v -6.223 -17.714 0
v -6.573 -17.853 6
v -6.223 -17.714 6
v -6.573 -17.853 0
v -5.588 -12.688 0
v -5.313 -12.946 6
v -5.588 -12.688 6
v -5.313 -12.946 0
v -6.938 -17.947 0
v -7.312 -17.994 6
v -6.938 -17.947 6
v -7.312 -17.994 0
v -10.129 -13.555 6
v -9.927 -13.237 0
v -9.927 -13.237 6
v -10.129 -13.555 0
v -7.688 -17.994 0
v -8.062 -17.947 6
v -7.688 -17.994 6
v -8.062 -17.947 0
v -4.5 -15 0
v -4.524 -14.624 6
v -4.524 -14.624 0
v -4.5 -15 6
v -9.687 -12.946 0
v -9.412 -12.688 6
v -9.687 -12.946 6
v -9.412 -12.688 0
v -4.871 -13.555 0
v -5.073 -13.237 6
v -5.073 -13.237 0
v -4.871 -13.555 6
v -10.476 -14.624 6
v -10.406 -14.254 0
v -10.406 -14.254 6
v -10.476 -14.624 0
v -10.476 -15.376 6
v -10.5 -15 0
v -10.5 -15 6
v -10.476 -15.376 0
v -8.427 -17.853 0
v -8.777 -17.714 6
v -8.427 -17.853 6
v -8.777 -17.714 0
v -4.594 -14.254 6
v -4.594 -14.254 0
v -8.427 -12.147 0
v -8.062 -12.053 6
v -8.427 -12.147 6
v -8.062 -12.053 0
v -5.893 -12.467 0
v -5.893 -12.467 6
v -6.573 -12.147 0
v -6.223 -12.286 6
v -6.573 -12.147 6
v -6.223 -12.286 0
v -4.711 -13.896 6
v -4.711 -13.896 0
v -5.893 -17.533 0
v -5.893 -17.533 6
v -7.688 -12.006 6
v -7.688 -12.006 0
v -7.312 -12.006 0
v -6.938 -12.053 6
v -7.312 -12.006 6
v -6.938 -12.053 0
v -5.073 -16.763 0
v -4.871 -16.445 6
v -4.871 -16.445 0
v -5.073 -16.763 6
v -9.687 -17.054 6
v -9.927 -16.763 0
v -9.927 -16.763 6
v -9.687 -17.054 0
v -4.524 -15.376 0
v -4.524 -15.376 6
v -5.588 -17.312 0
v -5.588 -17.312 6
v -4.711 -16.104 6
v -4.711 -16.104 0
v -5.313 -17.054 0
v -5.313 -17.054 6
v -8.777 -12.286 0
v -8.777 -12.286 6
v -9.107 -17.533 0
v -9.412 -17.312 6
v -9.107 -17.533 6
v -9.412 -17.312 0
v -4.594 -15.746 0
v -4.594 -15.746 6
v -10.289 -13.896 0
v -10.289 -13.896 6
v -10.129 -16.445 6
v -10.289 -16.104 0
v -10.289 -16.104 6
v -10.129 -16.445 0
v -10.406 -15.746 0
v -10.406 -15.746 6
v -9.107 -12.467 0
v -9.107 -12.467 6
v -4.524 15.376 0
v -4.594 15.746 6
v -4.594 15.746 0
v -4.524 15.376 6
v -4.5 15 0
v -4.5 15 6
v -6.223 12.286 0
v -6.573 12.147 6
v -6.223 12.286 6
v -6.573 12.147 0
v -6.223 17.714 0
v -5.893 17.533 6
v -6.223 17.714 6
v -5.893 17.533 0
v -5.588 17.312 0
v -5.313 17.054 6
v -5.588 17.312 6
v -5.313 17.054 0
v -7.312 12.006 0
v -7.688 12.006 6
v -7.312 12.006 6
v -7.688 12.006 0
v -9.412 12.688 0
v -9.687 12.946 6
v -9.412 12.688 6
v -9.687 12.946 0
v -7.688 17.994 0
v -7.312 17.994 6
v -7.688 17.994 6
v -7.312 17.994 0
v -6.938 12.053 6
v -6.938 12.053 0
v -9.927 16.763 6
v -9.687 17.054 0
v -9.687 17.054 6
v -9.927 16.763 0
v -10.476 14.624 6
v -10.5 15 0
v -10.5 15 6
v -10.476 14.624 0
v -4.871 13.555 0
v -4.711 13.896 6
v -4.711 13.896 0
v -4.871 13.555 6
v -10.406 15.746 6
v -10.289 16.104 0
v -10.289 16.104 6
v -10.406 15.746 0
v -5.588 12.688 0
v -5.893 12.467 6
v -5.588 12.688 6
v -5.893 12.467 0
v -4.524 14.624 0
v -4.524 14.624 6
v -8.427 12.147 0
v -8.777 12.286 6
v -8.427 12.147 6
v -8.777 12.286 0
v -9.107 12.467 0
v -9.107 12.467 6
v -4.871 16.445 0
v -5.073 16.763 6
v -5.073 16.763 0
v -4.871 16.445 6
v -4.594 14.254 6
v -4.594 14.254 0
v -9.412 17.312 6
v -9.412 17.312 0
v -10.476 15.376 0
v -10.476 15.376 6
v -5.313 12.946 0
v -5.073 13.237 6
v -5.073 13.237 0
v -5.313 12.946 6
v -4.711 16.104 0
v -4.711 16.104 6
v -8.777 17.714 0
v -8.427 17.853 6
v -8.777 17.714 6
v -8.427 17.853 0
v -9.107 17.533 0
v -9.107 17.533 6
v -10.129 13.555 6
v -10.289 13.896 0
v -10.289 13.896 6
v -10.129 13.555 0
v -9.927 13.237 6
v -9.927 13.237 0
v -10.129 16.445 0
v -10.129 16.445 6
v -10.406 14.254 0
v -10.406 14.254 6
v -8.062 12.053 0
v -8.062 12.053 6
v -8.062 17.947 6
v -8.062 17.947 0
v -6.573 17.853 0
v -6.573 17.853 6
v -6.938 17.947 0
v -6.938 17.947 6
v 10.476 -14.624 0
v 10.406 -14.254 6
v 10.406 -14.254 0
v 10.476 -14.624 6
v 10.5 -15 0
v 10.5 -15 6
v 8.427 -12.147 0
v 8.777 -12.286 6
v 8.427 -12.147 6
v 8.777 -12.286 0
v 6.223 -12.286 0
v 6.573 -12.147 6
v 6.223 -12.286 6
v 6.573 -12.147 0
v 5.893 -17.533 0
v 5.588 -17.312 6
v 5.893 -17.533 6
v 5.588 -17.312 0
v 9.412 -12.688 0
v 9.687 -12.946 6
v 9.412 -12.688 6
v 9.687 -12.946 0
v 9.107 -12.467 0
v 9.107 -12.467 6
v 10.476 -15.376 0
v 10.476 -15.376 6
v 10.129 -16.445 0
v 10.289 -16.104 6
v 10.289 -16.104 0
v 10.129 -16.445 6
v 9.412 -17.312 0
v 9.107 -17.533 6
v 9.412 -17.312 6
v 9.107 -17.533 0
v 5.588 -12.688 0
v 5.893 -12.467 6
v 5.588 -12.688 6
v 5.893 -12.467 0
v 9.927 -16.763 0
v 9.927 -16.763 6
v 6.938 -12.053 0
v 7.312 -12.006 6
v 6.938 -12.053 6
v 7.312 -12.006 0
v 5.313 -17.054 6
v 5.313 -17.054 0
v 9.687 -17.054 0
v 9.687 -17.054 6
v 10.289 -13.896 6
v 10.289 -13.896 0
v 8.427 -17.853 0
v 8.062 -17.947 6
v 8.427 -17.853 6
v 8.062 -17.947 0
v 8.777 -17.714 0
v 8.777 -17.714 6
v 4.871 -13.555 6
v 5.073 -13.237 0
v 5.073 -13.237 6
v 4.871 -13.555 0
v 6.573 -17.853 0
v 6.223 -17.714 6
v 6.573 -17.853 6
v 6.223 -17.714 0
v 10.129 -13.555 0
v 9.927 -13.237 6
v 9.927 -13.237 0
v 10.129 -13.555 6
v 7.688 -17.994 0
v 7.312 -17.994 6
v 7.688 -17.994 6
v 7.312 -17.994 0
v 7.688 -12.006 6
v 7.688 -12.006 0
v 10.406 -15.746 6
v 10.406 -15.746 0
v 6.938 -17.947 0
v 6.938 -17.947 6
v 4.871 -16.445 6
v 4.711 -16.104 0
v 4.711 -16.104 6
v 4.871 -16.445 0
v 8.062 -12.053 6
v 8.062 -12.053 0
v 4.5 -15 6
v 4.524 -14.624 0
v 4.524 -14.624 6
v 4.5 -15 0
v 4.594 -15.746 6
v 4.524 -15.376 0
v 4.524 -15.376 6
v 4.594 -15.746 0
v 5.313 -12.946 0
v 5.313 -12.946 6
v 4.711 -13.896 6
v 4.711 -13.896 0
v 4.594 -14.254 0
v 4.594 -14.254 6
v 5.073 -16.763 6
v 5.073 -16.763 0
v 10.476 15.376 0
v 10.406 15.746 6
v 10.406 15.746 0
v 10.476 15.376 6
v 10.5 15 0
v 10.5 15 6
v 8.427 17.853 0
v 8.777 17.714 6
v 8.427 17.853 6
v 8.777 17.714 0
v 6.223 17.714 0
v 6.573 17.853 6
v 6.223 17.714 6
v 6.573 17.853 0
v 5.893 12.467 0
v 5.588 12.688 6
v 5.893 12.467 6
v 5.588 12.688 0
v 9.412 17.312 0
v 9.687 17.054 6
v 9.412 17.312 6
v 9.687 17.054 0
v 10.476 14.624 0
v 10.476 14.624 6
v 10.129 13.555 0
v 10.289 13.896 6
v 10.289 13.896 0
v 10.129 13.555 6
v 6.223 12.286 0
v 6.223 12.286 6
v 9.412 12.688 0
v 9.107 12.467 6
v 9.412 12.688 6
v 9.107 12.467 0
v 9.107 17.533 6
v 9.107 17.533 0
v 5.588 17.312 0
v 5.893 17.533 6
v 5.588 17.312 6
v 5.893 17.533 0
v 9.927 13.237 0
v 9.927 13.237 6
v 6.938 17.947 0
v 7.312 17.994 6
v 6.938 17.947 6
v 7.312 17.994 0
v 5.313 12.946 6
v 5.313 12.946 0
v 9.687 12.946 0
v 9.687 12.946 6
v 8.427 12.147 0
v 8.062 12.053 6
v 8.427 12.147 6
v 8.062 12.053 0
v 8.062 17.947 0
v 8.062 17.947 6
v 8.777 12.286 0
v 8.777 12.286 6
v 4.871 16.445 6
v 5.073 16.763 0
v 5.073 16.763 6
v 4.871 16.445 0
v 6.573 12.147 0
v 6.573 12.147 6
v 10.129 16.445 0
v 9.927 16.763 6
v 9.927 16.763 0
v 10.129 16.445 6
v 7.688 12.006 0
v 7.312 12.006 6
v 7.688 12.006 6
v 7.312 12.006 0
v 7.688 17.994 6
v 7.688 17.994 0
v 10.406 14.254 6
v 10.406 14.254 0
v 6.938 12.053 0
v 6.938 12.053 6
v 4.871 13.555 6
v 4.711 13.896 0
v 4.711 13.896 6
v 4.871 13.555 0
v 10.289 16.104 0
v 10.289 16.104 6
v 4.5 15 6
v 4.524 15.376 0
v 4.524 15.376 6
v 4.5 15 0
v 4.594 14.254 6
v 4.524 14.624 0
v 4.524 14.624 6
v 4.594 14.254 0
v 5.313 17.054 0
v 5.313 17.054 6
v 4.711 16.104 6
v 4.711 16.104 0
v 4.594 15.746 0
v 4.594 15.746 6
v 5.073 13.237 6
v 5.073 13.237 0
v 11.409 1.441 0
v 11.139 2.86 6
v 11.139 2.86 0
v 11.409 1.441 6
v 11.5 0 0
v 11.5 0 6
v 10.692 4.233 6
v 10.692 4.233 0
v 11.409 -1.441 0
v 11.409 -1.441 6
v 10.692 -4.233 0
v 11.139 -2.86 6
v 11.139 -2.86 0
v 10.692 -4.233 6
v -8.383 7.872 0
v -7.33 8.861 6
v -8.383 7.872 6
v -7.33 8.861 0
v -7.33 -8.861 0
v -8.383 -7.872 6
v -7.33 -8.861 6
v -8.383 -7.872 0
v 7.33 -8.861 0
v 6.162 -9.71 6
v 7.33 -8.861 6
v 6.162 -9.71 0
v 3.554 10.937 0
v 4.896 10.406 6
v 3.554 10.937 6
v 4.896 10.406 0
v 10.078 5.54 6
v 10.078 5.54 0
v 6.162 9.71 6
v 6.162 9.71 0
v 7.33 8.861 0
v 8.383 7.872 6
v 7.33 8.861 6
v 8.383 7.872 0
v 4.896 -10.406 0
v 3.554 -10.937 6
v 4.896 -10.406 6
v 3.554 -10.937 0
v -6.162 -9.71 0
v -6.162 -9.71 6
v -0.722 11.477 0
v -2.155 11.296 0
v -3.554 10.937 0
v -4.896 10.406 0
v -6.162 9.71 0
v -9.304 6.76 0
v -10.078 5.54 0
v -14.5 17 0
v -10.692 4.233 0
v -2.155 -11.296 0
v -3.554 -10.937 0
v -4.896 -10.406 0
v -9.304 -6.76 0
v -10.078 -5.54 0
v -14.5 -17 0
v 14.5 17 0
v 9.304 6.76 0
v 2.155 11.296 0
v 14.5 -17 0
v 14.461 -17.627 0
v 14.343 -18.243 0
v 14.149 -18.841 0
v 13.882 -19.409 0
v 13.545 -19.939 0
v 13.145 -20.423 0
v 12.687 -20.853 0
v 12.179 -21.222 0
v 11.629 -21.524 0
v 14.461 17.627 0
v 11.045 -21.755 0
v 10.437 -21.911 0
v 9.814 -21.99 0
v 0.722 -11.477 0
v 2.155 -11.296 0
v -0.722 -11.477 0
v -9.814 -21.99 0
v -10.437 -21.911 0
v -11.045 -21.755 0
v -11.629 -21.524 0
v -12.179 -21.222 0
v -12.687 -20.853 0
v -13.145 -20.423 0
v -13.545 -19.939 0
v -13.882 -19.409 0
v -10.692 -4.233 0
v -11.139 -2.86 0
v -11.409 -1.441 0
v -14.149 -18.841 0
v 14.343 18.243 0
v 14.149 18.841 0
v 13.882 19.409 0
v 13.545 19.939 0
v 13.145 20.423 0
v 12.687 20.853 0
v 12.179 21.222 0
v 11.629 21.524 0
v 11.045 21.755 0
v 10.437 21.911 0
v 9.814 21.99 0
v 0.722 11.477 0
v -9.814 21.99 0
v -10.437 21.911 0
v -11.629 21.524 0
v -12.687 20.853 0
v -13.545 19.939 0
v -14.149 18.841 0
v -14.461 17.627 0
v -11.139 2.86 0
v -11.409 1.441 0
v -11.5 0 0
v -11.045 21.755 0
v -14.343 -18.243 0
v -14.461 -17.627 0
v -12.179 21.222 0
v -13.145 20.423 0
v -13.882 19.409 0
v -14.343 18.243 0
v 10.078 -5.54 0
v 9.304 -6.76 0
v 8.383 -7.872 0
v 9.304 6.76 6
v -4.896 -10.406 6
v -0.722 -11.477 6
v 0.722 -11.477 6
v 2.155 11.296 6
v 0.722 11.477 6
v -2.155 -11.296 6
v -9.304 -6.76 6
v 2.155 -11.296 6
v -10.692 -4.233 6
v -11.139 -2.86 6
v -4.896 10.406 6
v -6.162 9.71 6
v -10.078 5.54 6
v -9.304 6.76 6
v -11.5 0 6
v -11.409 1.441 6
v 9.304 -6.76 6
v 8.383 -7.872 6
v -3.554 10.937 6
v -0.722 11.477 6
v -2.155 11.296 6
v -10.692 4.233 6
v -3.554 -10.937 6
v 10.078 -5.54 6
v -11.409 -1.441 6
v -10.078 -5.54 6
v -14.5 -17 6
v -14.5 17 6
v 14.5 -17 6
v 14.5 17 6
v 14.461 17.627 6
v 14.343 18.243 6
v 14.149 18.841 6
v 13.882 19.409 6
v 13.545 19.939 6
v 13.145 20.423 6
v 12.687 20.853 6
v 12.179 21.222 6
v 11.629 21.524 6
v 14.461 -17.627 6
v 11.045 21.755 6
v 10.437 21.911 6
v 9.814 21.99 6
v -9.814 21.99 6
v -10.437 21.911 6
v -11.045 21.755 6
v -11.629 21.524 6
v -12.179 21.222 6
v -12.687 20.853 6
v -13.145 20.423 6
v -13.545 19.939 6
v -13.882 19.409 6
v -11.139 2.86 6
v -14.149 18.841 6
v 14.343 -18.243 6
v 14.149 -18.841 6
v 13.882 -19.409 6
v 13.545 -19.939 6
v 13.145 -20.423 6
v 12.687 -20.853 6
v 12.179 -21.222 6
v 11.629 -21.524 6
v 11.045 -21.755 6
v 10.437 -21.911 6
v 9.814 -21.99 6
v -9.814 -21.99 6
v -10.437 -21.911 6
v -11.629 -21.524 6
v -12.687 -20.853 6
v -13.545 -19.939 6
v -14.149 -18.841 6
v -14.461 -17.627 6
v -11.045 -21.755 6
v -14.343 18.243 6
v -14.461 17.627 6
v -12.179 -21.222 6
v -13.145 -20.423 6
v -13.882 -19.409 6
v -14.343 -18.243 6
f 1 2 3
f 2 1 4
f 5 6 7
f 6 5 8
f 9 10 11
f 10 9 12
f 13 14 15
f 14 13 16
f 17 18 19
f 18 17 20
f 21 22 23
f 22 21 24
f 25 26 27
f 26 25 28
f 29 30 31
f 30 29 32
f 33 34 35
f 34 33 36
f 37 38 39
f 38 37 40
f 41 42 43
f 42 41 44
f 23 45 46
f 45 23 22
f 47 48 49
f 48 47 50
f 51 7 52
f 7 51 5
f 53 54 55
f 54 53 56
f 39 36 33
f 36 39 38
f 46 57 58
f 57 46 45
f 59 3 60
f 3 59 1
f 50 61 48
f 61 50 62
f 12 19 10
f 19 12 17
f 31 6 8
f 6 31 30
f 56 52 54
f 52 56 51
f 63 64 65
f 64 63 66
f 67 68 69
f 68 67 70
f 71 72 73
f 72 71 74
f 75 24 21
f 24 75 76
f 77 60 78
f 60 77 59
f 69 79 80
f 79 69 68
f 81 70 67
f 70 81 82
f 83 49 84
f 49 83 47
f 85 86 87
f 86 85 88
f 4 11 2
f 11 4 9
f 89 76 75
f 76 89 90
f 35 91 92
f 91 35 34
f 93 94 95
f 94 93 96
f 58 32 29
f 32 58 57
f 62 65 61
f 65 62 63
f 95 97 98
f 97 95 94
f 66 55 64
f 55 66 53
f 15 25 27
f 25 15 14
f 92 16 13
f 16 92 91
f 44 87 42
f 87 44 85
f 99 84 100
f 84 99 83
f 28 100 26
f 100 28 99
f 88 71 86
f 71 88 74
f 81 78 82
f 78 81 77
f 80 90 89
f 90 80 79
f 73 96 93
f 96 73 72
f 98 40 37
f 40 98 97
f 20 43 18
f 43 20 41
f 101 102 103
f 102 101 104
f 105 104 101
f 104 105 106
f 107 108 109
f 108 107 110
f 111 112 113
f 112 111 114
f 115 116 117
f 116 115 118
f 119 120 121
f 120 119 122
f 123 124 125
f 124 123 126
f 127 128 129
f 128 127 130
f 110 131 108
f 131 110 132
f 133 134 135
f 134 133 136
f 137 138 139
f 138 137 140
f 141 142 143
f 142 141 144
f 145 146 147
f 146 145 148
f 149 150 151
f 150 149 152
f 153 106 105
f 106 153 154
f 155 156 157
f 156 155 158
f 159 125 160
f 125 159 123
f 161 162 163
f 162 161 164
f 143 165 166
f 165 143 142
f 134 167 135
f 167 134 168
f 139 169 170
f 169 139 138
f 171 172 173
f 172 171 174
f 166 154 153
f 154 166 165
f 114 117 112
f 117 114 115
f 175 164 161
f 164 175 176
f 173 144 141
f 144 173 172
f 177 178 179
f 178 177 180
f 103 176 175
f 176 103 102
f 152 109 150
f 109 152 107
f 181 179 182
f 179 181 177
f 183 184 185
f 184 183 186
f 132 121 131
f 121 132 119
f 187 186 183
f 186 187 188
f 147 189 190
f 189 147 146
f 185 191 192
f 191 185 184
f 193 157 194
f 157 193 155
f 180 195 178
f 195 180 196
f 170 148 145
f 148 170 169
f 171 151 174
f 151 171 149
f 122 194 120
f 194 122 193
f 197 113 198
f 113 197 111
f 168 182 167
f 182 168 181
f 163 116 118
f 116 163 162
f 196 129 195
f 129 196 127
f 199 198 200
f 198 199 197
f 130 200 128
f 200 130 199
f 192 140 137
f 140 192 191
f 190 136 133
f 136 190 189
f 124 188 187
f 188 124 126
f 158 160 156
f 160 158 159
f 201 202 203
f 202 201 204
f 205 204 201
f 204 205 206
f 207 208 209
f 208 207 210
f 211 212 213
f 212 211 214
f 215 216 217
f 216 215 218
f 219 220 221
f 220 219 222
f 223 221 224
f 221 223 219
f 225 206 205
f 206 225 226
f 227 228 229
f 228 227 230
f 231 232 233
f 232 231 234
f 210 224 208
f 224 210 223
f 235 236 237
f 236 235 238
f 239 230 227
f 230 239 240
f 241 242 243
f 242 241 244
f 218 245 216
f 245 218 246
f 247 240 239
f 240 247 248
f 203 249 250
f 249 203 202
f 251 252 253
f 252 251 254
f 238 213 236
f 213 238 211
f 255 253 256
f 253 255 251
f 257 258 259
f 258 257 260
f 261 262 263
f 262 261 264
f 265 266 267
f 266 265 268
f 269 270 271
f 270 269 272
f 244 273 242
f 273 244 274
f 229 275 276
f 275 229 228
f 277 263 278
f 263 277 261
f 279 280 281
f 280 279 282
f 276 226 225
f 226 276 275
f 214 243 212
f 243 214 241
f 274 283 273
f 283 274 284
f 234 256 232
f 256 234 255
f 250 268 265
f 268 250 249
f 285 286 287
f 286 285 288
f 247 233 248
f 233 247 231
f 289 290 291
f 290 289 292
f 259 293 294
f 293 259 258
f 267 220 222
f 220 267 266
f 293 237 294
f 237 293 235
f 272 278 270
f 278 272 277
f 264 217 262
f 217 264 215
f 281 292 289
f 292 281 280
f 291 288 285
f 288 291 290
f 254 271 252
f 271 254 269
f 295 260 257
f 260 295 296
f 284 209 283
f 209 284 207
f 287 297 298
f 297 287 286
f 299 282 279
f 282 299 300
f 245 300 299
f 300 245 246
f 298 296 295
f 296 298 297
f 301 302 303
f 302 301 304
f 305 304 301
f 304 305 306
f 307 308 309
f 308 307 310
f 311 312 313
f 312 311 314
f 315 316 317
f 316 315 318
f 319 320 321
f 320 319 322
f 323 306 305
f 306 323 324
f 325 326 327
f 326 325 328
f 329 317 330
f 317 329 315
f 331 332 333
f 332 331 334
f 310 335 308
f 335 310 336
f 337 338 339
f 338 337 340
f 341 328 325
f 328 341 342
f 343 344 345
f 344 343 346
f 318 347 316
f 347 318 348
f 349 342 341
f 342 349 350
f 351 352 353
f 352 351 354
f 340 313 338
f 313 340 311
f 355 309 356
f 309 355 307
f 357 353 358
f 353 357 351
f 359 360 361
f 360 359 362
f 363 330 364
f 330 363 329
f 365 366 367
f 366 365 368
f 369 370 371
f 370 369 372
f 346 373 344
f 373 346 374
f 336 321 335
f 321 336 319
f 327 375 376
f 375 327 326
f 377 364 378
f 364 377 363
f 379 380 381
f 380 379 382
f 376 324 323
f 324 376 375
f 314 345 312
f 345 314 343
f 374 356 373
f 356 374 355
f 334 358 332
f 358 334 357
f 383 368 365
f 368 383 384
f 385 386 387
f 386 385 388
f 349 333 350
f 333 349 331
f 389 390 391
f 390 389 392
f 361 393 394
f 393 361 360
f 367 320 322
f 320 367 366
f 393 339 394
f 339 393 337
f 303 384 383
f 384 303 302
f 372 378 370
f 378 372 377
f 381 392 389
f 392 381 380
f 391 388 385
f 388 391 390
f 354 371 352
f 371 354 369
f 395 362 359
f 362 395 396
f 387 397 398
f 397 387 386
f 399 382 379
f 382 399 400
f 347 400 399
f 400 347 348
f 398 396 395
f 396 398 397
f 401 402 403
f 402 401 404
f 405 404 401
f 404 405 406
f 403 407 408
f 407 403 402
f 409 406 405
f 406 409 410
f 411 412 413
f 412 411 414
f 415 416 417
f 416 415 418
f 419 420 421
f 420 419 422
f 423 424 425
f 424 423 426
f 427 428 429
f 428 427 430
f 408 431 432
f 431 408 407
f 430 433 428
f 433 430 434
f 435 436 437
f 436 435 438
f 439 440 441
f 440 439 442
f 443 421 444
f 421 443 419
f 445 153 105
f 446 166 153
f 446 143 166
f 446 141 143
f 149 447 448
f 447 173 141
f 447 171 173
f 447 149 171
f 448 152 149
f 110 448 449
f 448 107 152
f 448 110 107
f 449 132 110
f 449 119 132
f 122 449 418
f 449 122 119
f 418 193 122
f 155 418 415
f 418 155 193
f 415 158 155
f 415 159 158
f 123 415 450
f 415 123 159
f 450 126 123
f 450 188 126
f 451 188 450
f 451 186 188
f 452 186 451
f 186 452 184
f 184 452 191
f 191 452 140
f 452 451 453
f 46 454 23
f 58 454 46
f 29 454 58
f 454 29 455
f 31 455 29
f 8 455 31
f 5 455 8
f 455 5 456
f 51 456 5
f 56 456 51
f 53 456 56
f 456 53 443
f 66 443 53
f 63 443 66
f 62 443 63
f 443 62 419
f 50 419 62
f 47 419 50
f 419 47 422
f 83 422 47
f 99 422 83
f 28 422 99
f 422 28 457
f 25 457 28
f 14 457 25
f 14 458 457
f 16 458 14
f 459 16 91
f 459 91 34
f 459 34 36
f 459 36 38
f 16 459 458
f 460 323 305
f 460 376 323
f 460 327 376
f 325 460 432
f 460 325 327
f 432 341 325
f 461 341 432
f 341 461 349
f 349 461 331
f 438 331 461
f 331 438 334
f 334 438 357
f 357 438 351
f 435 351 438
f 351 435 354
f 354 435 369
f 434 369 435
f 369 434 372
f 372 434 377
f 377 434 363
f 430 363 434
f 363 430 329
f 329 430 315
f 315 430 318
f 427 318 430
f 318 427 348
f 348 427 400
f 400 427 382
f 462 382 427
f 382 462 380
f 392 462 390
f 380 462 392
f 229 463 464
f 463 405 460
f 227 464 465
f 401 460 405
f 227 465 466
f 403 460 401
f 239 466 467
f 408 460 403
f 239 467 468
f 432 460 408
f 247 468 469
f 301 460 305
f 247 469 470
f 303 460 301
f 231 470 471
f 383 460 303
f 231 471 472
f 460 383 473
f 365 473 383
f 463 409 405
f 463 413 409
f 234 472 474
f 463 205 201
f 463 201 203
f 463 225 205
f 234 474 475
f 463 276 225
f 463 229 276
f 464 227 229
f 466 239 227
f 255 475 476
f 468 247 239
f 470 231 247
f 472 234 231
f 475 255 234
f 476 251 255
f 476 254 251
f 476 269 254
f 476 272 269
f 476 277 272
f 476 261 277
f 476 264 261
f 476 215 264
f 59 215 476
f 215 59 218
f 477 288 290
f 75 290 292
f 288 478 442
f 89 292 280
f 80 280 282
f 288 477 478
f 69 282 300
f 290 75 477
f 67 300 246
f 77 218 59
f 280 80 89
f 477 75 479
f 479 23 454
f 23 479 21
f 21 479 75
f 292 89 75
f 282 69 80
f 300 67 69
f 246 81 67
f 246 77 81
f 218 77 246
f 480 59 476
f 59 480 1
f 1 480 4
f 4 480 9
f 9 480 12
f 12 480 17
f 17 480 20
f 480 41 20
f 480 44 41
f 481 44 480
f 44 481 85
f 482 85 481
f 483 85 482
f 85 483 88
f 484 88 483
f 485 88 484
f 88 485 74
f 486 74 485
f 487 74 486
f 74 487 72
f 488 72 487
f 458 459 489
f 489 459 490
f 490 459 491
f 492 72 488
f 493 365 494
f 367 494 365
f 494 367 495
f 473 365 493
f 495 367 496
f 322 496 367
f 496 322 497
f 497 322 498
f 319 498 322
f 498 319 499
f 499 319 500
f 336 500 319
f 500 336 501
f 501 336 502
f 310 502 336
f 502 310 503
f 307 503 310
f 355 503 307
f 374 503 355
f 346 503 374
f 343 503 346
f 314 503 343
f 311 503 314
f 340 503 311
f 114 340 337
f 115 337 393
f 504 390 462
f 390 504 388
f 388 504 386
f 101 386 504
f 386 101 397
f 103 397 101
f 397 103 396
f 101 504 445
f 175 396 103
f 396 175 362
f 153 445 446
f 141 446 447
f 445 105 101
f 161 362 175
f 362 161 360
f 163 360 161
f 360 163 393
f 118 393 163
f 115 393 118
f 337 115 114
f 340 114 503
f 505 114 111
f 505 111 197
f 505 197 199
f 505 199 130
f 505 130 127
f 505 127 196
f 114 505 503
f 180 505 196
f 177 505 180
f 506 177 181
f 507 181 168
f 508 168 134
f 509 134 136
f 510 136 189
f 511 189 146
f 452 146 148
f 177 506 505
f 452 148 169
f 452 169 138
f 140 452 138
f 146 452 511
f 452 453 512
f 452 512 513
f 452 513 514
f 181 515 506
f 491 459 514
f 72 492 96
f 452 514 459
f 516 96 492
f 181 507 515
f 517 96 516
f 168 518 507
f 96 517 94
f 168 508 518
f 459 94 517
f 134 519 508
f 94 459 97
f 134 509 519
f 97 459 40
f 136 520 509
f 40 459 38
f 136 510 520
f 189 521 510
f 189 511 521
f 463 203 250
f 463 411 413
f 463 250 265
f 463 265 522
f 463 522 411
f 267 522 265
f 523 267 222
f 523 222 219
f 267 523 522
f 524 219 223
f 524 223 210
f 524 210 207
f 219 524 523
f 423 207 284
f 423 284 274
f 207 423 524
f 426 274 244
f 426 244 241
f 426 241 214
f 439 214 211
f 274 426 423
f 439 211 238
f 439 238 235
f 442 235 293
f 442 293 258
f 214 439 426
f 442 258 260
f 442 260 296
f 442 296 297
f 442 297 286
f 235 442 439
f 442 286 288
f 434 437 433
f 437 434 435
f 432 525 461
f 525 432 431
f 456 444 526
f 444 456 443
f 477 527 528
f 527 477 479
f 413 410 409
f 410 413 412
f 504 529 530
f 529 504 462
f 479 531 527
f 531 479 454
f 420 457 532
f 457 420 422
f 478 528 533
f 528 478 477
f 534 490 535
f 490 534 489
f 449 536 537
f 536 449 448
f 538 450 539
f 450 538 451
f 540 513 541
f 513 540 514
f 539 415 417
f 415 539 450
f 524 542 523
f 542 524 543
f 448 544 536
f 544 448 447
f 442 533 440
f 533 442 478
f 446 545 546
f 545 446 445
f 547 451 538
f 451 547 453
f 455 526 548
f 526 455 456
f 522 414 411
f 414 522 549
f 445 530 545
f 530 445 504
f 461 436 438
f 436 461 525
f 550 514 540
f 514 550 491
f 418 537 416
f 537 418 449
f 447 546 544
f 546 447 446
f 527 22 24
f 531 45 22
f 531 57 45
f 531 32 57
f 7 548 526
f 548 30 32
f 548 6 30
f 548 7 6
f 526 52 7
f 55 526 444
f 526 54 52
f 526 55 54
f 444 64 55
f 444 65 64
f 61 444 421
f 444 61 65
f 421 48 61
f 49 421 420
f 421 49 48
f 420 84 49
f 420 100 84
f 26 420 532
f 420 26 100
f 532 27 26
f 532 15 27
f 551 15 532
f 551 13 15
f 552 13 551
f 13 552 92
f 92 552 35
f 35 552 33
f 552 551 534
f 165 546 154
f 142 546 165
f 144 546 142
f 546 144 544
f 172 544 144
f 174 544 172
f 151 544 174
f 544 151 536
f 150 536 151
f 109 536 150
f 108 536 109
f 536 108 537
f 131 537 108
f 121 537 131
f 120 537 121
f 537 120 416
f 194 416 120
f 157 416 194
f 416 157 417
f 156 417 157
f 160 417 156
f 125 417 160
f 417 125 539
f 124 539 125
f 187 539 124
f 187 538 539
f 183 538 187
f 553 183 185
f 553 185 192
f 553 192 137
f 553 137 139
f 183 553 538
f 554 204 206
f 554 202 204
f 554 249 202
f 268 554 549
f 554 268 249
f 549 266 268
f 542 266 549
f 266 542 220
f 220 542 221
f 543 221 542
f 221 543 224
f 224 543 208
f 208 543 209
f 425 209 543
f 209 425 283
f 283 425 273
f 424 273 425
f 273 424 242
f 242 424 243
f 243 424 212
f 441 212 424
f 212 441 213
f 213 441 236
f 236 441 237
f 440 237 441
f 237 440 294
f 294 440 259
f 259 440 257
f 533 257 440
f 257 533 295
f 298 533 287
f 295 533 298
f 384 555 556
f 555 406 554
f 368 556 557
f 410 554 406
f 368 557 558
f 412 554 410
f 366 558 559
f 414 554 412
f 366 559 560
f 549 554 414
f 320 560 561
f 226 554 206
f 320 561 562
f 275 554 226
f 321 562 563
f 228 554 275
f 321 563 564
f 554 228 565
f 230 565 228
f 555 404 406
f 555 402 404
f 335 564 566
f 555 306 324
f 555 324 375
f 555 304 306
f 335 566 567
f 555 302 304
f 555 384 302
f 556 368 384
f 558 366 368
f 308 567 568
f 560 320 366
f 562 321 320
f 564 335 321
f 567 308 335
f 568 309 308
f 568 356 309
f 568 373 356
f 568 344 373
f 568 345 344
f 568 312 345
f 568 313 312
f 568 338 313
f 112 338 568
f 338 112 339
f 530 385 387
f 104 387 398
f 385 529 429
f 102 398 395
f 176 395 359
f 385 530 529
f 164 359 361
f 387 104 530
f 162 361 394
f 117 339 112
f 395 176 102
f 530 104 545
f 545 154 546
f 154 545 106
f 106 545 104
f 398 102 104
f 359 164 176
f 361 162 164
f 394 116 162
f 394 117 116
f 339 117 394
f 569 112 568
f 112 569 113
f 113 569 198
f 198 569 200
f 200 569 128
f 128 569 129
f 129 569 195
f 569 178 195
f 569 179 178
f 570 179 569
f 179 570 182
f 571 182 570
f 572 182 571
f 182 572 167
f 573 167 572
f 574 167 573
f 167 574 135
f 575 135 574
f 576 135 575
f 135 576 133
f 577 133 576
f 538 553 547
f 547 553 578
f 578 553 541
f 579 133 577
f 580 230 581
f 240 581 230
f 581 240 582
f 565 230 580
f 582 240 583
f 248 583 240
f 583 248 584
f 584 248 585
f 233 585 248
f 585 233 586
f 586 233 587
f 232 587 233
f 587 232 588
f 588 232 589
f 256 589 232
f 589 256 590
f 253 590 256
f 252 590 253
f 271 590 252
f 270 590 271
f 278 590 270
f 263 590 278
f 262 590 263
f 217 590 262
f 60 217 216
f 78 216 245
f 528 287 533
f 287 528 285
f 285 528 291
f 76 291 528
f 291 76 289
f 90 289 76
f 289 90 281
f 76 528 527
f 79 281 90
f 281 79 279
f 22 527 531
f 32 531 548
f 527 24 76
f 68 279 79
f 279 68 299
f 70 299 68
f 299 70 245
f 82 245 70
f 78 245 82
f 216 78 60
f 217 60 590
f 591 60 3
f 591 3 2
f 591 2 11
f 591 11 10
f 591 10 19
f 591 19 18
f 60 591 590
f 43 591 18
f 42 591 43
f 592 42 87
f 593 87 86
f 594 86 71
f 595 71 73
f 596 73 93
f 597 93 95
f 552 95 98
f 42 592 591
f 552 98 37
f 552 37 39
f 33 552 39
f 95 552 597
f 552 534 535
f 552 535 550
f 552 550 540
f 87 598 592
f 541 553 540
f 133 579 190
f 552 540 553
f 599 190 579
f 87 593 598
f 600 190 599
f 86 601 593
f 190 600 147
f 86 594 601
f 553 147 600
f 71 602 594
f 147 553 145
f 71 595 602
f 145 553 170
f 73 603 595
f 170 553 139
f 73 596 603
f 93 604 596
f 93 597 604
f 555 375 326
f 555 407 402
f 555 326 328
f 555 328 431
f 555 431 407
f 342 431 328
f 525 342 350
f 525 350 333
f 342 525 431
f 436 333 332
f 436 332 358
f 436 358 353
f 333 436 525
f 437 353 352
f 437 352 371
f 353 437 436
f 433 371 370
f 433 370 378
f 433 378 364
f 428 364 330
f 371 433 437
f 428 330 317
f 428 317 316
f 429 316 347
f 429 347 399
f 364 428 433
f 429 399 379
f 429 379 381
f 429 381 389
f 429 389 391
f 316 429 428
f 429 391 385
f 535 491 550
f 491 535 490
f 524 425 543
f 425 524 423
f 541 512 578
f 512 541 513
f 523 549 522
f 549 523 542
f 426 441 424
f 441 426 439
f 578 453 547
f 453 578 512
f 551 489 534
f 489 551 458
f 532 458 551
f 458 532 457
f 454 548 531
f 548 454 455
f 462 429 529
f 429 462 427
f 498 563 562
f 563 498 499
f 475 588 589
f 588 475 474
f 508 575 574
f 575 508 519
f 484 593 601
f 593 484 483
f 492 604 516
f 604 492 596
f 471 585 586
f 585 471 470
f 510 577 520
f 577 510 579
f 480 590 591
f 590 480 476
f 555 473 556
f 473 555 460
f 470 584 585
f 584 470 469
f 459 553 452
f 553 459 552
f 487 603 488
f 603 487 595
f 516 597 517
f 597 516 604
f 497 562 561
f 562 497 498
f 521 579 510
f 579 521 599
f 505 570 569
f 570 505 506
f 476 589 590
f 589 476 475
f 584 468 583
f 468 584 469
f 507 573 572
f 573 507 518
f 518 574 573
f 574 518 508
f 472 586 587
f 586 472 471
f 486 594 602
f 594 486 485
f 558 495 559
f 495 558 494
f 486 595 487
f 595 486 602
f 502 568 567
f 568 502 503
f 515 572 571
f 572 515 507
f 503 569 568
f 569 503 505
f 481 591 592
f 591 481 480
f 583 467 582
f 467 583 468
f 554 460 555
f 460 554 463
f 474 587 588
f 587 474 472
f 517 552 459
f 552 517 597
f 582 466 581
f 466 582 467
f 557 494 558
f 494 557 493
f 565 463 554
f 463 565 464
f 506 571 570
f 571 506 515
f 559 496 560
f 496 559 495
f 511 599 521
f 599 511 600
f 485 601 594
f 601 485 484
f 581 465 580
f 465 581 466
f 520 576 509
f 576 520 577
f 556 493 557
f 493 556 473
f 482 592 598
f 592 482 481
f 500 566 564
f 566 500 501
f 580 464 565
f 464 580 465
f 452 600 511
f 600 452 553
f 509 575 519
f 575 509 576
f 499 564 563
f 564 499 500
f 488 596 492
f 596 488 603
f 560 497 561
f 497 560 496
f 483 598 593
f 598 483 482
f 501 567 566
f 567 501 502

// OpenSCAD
$fn = 50;


difference() {
	union() {
		hull() {
			translate(v = [-9.5000000000, 17.0000000000, 0]) {
				cylinder(h = 6, r = 5);
			}
			translate(v = [9.5000000000, 17.0000000000, 0]) {
				cylinder(h = 6, r = 5);
			}
			translate(v = [-9.5000000000, -17.0000000000, 0]) {
				cylinder(h = 6, r = 5);
			}
			translate(v = [9.5000000000, -17.0000000000, 0]) {
				cylinder(h = 6, r = 5);
			}
		}
	}
	union() {
		#translate(v = [-7.5000000000, -15.0000000000, -100.0000000000]) {
			cylinder(h = 200, r = 3.0000000000);
		}
		#translate(v = [-7.5000000000, 15.0000000000, -100.0000000000]) {
			cylinder(h = 200, r = 3.0000000000);
		}
		#translate(v = [7.5000000000, -15.0000000000, -100.0000000000]) {
			cylinder(h = 200, r = 3.0000000000);
		}
		#translate(v = [7.5000000000, 15.0000000000, -100.0000000000]) {
			cylinder(h = 200, r = 3.0000000000);
		}
		#cylinder(h = 6, r = 11.5000000000);
	}
}
